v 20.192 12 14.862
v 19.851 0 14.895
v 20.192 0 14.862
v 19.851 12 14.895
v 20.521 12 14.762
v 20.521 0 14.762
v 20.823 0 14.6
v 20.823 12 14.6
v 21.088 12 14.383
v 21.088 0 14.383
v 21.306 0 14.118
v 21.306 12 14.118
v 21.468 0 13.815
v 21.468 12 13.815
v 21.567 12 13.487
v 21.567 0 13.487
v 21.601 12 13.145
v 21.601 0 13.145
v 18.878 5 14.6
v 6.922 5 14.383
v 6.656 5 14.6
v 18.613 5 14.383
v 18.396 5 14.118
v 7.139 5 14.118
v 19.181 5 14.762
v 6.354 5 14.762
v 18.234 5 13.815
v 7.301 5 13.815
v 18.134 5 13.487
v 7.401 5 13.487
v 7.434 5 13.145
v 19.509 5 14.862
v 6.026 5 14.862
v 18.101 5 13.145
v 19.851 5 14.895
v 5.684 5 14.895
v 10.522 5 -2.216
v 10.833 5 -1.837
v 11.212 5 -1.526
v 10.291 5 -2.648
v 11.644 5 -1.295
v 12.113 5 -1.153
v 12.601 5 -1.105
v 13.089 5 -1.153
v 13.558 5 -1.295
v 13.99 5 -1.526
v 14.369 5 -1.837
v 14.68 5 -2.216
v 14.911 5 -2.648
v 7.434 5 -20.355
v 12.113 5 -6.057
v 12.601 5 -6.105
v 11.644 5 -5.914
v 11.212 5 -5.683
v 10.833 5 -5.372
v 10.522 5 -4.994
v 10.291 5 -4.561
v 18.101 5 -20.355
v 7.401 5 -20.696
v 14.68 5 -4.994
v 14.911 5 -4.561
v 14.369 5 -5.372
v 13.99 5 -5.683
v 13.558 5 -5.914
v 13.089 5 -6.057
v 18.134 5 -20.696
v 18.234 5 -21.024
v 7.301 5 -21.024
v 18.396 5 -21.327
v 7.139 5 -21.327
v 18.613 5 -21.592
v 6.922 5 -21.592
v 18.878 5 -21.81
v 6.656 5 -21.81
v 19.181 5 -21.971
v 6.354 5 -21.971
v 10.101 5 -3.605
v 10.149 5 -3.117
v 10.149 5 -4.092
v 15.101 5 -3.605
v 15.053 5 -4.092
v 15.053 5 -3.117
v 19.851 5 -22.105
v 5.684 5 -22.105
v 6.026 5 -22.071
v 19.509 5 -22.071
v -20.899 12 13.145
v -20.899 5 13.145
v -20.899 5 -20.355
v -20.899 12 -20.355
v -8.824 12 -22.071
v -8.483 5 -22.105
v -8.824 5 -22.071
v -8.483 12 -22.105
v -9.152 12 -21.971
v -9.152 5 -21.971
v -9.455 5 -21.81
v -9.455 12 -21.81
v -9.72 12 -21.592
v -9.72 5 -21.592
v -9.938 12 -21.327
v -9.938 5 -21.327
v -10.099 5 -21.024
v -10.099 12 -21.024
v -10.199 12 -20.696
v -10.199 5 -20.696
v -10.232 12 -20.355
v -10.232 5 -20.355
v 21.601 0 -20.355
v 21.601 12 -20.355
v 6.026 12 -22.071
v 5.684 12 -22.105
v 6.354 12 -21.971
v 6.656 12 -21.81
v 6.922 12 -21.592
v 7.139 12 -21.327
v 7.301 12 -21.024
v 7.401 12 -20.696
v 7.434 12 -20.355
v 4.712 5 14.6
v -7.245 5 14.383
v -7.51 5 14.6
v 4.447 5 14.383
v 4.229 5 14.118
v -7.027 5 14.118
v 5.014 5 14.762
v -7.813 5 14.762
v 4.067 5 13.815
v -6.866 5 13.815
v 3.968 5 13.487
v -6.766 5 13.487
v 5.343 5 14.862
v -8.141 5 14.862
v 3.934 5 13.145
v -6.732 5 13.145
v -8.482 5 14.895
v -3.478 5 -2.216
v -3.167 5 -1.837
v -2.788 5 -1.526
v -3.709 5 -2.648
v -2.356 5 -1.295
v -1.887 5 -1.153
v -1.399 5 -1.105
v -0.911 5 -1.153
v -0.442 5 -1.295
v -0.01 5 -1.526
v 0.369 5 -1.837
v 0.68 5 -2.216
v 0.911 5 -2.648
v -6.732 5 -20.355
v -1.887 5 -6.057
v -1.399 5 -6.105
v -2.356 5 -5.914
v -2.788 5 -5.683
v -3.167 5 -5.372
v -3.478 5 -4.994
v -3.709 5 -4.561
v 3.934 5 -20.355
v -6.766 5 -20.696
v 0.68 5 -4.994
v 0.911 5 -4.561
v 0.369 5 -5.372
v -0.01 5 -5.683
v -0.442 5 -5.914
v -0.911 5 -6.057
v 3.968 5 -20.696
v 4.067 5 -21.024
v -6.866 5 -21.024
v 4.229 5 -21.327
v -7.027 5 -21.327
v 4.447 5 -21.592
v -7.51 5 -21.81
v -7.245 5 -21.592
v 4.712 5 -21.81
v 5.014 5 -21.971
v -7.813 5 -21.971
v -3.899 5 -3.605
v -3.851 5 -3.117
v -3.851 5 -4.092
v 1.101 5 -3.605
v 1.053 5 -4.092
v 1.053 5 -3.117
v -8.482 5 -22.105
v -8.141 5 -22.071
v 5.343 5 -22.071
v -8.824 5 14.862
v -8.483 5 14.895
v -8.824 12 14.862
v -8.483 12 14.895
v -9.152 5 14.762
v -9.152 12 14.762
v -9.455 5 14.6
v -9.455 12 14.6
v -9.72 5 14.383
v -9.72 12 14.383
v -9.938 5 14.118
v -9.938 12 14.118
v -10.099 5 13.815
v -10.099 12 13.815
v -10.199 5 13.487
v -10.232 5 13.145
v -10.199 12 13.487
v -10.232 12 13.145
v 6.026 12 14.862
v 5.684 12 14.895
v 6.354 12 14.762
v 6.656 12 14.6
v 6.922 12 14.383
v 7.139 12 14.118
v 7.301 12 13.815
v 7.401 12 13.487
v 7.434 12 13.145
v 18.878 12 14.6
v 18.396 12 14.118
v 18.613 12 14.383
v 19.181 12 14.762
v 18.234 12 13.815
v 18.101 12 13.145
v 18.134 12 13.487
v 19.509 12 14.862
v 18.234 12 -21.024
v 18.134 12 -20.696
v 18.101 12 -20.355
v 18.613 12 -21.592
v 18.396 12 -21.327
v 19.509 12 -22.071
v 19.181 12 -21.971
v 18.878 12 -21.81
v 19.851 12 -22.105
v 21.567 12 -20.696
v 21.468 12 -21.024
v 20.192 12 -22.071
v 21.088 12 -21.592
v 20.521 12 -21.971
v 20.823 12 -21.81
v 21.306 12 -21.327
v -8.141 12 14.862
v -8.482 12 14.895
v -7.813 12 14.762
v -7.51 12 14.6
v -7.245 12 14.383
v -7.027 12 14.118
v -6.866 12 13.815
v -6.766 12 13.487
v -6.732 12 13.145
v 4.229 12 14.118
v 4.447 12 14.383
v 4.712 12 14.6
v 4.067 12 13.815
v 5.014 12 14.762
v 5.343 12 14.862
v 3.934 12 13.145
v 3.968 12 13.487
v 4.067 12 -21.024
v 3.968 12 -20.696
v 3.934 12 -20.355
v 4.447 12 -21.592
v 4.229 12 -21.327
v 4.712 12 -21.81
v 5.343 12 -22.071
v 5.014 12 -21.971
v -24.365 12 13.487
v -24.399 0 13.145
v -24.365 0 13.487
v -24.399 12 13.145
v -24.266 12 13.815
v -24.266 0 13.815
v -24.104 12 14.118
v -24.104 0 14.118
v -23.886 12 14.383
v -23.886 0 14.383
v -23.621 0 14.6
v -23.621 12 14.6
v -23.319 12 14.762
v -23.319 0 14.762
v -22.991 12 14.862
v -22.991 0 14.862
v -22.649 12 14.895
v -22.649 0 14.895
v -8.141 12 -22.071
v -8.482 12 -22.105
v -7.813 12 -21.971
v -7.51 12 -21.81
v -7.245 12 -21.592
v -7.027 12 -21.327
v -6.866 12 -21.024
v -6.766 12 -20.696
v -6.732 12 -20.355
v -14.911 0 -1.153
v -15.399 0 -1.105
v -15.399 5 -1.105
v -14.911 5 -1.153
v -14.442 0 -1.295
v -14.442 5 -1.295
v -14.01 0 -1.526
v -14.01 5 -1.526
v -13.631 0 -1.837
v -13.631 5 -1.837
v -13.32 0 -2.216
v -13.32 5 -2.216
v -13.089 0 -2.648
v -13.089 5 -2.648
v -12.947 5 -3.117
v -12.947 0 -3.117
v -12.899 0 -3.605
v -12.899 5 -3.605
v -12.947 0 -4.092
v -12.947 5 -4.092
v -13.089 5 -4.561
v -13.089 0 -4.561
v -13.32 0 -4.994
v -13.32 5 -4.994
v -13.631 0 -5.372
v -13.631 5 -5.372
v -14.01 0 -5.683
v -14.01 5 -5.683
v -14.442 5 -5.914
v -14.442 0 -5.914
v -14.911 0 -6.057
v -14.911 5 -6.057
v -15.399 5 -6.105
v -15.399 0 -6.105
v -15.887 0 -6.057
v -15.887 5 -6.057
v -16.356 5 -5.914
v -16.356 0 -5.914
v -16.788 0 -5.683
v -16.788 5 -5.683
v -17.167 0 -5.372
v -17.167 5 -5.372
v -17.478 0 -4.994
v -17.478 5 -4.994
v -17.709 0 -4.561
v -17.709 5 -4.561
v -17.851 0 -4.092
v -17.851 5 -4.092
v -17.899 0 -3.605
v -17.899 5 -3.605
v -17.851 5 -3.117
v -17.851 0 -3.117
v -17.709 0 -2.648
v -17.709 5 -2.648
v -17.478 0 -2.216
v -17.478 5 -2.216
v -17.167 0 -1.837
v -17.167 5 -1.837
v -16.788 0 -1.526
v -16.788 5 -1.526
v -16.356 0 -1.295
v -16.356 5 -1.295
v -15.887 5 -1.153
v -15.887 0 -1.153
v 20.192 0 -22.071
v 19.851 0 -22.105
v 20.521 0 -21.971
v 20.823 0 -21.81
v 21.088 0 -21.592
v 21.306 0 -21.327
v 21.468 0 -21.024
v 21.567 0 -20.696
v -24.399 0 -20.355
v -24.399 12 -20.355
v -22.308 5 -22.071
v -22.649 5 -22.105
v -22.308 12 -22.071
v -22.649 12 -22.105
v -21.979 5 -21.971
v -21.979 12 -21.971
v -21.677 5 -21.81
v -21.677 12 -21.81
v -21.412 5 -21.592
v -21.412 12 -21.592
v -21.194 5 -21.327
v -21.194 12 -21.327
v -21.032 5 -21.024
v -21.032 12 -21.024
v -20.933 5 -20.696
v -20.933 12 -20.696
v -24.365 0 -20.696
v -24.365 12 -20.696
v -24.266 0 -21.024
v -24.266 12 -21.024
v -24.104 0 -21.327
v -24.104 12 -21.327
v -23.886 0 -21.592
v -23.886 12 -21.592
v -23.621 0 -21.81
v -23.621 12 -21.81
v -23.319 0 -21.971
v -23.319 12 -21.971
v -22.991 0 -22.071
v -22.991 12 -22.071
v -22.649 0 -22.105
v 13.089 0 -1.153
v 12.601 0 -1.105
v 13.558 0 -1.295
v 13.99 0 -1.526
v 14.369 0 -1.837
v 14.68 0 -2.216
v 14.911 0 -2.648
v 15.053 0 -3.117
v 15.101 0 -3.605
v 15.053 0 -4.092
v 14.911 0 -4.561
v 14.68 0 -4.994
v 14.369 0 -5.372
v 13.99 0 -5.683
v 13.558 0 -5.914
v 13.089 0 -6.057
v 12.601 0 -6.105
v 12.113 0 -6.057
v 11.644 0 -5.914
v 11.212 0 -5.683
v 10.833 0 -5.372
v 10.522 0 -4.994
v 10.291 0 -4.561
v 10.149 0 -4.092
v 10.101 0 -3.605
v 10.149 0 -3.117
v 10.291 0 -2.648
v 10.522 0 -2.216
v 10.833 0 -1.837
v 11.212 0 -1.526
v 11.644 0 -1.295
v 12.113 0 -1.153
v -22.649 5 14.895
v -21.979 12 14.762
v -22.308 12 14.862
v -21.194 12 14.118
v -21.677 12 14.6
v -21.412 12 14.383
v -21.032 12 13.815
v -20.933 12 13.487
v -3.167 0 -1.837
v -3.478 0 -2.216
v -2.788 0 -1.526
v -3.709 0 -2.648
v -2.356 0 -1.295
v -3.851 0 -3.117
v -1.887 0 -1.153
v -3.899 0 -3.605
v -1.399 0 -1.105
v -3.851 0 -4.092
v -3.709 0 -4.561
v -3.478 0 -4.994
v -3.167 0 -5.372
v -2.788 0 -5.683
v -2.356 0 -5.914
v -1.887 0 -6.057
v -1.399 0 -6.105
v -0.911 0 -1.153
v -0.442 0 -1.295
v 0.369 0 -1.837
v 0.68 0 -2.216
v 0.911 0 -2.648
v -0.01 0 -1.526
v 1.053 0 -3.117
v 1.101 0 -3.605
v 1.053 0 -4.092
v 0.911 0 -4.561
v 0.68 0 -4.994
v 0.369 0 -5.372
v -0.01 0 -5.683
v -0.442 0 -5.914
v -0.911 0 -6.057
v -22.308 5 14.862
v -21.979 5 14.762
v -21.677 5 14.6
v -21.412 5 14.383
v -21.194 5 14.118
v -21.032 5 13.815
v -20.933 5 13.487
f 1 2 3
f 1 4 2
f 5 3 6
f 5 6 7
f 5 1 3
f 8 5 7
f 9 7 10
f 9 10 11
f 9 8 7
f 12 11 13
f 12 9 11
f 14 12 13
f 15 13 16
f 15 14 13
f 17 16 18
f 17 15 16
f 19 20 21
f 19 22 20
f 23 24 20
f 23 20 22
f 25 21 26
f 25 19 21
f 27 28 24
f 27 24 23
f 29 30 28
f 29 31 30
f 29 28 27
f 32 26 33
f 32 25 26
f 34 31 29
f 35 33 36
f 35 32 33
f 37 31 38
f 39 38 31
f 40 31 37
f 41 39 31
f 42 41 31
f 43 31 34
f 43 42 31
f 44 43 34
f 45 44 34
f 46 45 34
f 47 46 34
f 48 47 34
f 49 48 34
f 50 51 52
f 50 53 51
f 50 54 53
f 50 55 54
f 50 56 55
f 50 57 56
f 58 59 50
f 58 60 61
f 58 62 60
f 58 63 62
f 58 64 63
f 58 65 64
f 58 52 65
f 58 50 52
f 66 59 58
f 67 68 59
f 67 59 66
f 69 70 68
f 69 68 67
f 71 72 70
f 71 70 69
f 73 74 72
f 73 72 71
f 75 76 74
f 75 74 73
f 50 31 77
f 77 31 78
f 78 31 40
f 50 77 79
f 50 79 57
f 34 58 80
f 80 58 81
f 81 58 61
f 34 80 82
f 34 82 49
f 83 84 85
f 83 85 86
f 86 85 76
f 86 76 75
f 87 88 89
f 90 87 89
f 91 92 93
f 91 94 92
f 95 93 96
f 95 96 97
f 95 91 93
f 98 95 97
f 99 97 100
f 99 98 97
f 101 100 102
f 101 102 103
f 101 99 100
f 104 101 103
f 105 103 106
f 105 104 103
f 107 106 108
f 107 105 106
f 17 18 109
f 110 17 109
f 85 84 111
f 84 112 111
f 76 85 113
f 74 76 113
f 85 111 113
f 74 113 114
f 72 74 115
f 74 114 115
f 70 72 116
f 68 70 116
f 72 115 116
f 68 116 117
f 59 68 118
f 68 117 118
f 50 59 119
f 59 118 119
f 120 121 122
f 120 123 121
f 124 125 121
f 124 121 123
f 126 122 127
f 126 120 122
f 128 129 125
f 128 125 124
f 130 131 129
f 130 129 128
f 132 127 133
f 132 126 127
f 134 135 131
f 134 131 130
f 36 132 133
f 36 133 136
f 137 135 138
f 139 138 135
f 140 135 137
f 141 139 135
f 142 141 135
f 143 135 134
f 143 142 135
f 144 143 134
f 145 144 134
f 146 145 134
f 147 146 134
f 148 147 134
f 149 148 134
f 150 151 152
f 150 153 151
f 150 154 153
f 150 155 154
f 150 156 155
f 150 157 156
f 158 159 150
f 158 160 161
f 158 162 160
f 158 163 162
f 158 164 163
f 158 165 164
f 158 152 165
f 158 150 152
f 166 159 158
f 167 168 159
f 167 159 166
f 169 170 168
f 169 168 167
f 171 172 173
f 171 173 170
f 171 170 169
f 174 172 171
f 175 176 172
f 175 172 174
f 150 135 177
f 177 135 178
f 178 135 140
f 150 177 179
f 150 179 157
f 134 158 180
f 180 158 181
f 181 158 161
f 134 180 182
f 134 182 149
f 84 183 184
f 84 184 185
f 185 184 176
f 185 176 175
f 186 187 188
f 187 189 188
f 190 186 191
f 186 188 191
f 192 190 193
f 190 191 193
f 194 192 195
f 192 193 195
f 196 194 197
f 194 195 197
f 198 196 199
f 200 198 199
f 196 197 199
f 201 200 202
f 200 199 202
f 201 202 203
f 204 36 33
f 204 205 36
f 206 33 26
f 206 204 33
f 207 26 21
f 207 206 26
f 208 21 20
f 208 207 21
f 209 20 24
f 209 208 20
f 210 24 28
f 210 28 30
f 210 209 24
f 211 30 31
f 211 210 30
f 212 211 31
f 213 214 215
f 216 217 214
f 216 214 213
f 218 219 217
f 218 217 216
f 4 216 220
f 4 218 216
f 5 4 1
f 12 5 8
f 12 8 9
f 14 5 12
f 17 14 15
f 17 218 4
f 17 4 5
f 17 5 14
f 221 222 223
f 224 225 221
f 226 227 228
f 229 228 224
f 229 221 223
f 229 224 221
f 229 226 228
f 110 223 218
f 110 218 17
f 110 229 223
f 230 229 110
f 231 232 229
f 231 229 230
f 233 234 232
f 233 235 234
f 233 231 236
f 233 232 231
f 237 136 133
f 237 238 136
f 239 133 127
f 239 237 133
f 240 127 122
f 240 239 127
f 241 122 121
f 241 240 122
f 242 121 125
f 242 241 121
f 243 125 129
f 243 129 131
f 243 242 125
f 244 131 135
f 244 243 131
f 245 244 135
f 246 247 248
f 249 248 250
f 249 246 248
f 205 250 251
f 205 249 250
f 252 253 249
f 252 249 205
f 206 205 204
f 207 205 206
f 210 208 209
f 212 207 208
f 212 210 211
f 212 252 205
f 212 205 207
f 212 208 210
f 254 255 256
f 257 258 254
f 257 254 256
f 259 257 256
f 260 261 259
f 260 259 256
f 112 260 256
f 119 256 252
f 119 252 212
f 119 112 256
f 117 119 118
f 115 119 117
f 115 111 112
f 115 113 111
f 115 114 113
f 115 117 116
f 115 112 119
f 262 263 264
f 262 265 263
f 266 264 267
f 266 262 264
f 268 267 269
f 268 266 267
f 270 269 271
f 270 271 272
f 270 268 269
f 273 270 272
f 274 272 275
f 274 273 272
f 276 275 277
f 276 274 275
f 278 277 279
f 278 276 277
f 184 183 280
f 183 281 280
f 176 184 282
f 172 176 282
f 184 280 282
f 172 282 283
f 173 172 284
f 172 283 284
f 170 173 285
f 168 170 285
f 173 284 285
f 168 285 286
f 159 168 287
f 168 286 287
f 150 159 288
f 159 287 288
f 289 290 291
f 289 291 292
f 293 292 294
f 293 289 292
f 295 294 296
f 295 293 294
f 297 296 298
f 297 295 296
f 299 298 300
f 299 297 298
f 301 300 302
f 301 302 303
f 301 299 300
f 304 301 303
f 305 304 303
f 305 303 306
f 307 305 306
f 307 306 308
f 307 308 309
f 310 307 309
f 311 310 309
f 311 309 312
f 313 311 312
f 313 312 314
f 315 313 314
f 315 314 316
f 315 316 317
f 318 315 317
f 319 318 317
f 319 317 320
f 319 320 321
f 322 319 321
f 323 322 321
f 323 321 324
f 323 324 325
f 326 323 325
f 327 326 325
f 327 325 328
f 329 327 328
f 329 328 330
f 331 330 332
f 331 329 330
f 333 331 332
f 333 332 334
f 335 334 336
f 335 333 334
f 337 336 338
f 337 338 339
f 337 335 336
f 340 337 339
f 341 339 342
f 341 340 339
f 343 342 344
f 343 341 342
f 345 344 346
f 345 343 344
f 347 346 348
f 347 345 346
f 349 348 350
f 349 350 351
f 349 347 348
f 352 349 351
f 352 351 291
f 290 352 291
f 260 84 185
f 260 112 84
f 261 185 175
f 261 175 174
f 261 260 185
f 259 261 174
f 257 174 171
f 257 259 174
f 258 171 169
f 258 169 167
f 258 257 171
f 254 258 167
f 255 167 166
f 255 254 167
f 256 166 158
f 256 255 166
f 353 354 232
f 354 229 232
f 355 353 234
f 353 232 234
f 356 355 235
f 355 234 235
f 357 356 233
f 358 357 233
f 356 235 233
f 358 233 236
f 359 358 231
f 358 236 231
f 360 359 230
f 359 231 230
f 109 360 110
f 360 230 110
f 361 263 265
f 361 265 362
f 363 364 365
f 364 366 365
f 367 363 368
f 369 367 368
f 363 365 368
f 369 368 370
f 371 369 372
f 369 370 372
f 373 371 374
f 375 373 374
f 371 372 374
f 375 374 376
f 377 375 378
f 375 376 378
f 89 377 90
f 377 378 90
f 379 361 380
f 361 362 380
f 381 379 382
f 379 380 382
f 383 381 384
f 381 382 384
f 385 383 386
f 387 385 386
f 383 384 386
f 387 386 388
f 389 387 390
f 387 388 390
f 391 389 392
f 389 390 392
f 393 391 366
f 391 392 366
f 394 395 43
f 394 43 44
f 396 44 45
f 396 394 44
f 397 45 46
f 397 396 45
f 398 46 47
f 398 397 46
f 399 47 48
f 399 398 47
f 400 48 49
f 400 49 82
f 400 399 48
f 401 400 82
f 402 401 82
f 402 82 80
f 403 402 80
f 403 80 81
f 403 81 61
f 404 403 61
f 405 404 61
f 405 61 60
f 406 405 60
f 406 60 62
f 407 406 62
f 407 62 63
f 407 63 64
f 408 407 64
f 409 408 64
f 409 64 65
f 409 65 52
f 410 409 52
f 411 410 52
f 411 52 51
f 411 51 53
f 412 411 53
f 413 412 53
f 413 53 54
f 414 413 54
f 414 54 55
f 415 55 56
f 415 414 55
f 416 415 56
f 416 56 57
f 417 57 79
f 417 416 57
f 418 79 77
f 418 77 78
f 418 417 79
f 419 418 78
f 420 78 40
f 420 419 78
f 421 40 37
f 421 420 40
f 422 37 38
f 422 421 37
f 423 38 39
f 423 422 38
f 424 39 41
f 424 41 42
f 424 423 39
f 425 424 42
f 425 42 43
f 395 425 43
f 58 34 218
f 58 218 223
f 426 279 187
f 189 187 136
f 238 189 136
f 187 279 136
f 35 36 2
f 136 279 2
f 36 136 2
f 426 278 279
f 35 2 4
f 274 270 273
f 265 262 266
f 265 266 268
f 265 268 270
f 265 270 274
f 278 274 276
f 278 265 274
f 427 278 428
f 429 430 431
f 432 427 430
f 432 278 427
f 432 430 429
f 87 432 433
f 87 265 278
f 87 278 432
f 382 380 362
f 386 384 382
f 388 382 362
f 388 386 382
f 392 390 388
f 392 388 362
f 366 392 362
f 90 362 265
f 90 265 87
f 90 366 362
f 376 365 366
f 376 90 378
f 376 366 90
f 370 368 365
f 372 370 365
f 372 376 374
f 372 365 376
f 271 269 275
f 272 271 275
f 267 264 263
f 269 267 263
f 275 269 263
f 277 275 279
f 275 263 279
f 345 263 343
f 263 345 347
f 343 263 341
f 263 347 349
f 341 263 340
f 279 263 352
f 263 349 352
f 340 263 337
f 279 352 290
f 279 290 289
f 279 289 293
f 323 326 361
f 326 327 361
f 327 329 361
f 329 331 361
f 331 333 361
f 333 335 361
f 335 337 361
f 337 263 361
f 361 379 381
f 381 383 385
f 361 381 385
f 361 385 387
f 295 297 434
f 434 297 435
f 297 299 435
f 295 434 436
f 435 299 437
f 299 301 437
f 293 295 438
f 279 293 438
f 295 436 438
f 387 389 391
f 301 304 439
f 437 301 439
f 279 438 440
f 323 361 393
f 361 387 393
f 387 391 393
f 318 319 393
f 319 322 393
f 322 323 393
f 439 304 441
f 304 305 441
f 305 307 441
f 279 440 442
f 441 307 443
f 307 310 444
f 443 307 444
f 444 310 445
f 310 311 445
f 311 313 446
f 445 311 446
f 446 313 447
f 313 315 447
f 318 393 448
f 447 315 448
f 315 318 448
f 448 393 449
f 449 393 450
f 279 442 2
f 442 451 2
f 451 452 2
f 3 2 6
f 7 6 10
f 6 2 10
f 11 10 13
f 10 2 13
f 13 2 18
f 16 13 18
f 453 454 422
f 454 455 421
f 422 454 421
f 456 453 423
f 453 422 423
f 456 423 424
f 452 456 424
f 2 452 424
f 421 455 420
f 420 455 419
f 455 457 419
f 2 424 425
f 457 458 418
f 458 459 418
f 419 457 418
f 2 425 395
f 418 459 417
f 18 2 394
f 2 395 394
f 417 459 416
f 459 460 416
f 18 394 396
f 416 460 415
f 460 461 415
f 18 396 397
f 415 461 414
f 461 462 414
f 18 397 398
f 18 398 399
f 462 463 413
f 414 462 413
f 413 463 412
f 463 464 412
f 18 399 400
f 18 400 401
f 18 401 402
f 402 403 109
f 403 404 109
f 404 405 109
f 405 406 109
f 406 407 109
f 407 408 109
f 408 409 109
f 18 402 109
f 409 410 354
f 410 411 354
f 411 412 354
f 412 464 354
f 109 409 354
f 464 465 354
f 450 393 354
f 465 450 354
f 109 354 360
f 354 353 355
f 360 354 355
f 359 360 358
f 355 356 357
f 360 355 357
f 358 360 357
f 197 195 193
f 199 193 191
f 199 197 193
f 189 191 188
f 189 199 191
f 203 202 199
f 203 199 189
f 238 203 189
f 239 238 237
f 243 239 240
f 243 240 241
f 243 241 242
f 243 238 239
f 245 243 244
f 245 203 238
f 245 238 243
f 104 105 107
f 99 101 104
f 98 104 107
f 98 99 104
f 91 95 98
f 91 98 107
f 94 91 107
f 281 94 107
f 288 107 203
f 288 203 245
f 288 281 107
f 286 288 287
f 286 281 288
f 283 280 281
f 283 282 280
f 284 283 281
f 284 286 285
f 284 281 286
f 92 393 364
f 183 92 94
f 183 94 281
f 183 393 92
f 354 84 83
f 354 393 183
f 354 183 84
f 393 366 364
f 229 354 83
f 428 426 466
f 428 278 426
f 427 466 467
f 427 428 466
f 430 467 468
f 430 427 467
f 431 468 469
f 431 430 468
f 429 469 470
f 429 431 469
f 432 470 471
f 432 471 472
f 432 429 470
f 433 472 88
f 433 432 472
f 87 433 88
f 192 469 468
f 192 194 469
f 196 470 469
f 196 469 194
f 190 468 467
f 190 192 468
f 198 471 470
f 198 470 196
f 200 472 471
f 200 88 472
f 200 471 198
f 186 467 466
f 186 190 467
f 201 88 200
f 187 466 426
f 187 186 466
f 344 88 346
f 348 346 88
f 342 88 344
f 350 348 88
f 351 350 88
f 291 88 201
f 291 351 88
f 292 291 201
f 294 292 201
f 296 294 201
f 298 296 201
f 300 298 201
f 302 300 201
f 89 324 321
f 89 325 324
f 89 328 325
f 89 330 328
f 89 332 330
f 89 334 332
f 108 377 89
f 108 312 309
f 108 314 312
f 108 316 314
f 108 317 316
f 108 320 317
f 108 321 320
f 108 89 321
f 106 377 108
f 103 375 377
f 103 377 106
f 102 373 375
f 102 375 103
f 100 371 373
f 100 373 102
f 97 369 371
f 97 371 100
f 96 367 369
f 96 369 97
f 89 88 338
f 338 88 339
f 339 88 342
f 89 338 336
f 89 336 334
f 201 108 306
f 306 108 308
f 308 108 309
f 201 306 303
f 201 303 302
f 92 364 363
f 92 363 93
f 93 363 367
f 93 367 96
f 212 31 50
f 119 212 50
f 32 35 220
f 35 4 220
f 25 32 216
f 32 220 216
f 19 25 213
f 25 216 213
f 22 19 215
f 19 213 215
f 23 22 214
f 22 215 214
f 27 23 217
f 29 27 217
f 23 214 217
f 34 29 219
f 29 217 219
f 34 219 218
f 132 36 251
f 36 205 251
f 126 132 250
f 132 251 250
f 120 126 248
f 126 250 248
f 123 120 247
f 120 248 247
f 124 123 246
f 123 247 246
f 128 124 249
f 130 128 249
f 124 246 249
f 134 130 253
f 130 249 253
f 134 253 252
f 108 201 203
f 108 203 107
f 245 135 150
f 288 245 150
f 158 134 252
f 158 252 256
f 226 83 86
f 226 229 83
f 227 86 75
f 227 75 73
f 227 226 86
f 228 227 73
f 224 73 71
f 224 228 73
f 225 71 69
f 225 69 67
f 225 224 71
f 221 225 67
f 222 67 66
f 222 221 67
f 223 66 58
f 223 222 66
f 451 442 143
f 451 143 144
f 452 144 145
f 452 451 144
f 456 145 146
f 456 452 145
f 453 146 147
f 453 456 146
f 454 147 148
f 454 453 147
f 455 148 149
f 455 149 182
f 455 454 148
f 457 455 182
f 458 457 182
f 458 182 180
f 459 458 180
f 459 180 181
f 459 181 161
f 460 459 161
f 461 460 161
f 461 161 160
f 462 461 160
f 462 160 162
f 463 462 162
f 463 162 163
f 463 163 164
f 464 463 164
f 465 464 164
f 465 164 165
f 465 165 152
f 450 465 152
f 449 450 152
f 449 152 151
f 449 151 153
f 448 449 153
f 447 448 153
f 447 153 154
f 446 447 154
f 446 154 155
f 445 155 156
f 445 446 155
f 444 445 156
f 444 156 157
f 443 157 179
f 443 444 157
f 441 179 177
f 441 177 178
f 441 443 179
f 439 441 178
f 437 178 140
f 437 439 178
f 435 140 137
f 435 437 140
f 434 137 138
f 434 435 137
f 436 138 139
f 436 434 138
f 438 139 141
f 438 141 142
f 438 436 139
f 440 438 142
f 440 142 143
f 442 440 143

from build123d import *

# Parameters (mm, degrees)
SKETCH1_W           = 46
SKETCH1_H           = 37
SKETCH1_R           = 2.5
BOSS_EXTRUDE1_DEPTH = 12
CUT_EXTRUDE1_START  = -7
SKETCH2_W           = 10.6666
SKETCH2_H           = 37
SKETCH2_R           = 2.5
CUT_EXTRUDE1_DEPTH  = 7
FILLET1_R           = 1.75


with BuildPart() as part:
    # Sketch1 → Boss-Extrude1 (new body)
    with BuildSketch(Plane(origin=(0, 0, 0), x_dir=(1, 0, 0), z_dir=(0, 1, 0))):
        with Locations((-1.399026764, 3.604622871)):
            Rectangle(SKETCH1_W, SKETCH1_H)
        with Locations(Location((-1.399026764, 3.604622871, 0), (0, 0, 270))):
            Circle(SKETCH1_R, mode=Mode.SUBTRACT)
        with Locations(Location((-15.399026764, 3.604622871, 0), (0, 0, 270))):
            Circle(SKETCH1_R, mode=Mode.SUBTRACT)
        with Locations(Location((12.600973236, 3.604622871, 0), (0, 0, 270))):
            Circle(SKETCH1_R, mode=Mode.SUBTRACT)
    extrude(amount=BOSS_EXTRUDE1_DEPTH)

    # Sketch2 → Cut-Extrude1 (cut)
    # profile 1 of 3: a face of its own
    with BuildSketch(Plane(origin=(0, 12, 0), x_dir=(1, 0, 0), z_dir=(0, 1, 0)).offset(CUT_EXTRUDE1_START)):
        with Locations((-15.565726764, 3.604622871)):
            Rectangle(SKETCH2_W, SKETCH2_H)
        with Locations(Location((-15.399026764, 3.604622871, 0), (0, 0, 270))):
            Circle(SKETCH2_R, mode=Mode.SUBTRACT)
    # profile 2 of 3: a face of its own
    with BuildSketch(Plane(origin=(0, 12, 0), x_dir=(1, 0, 0), z_dir=(0, 1, 0)).offset(CUT_EXTRUDE1_START)):
        with Locations((-1.399126764, 3.604622871)):
            Rectangle(SKETCH2_W, SKETCH2_H)
        with Locations(Location((-1.399026764, 3.604622871, 0), (0, 0, 270))):
            Circle(SKETCH2_R, mode=Mode.SUBTRACT)
    # profile 3 of 3: a face of its own
    with BuildSketch(Plane(origin=(0, 12, 0), x_dir=(1, 0, 0), z_dir=(0, 1, 0)).offset(CUT_EXTRUDE1_START)):
        with Locations((12.767473236, 3.604622871)):
            Rectangle(SKETCH2_W, SKETCH2_H)
        with Locations(Location((12.600973236, 3.604622871, 0), (0, 0, 270))):
            Circle(SKETCH2_R, mode=Mode.SUBTRACT)
    extrude(amount=CUT_EXTRUDE1_DEPTH, mode=Mode.SUBTRACT)

    # Fillet1
    fillet1_edges = [part.edges().sort_by_distance(p)[0] for p in [
        (-10.232426764, 8.5, -22.104622871),
        (-10.232426764, 8.5, 14.895377129),
        (-20.899026764, 8.5, 14.895377129),
        (-20.899026764, 8.5, -22.104622871),
        (3.934173236, 8.5, -22.104622871),
        (3.934173236, 8.5, 14.895377129),
        (-6.732426764, 8.5, 14.895377129),
        (-6.732426764, 8.5, -22.104622871),
        (18.100773236, 8.5, -22.104622871),
        (18.100773236, 8.5, 14.895377129),
        (7.434173236, 8.5, 14.895377129),
        (7.434173236, 8.5, -22.104622871),
        (21.600973236, 6, 14.895377129),
        (-24.399026764, 6, 14.895377129),
        (-24.399026764, 6, -22.104622871),
        (21.600973236, 6, -22.104622871),
    ]]
    fillet(fillet1_edges, radius=FILLET1_R - 0.0001)  # a hair under: the kernel refuses the full size


solid = part.part
